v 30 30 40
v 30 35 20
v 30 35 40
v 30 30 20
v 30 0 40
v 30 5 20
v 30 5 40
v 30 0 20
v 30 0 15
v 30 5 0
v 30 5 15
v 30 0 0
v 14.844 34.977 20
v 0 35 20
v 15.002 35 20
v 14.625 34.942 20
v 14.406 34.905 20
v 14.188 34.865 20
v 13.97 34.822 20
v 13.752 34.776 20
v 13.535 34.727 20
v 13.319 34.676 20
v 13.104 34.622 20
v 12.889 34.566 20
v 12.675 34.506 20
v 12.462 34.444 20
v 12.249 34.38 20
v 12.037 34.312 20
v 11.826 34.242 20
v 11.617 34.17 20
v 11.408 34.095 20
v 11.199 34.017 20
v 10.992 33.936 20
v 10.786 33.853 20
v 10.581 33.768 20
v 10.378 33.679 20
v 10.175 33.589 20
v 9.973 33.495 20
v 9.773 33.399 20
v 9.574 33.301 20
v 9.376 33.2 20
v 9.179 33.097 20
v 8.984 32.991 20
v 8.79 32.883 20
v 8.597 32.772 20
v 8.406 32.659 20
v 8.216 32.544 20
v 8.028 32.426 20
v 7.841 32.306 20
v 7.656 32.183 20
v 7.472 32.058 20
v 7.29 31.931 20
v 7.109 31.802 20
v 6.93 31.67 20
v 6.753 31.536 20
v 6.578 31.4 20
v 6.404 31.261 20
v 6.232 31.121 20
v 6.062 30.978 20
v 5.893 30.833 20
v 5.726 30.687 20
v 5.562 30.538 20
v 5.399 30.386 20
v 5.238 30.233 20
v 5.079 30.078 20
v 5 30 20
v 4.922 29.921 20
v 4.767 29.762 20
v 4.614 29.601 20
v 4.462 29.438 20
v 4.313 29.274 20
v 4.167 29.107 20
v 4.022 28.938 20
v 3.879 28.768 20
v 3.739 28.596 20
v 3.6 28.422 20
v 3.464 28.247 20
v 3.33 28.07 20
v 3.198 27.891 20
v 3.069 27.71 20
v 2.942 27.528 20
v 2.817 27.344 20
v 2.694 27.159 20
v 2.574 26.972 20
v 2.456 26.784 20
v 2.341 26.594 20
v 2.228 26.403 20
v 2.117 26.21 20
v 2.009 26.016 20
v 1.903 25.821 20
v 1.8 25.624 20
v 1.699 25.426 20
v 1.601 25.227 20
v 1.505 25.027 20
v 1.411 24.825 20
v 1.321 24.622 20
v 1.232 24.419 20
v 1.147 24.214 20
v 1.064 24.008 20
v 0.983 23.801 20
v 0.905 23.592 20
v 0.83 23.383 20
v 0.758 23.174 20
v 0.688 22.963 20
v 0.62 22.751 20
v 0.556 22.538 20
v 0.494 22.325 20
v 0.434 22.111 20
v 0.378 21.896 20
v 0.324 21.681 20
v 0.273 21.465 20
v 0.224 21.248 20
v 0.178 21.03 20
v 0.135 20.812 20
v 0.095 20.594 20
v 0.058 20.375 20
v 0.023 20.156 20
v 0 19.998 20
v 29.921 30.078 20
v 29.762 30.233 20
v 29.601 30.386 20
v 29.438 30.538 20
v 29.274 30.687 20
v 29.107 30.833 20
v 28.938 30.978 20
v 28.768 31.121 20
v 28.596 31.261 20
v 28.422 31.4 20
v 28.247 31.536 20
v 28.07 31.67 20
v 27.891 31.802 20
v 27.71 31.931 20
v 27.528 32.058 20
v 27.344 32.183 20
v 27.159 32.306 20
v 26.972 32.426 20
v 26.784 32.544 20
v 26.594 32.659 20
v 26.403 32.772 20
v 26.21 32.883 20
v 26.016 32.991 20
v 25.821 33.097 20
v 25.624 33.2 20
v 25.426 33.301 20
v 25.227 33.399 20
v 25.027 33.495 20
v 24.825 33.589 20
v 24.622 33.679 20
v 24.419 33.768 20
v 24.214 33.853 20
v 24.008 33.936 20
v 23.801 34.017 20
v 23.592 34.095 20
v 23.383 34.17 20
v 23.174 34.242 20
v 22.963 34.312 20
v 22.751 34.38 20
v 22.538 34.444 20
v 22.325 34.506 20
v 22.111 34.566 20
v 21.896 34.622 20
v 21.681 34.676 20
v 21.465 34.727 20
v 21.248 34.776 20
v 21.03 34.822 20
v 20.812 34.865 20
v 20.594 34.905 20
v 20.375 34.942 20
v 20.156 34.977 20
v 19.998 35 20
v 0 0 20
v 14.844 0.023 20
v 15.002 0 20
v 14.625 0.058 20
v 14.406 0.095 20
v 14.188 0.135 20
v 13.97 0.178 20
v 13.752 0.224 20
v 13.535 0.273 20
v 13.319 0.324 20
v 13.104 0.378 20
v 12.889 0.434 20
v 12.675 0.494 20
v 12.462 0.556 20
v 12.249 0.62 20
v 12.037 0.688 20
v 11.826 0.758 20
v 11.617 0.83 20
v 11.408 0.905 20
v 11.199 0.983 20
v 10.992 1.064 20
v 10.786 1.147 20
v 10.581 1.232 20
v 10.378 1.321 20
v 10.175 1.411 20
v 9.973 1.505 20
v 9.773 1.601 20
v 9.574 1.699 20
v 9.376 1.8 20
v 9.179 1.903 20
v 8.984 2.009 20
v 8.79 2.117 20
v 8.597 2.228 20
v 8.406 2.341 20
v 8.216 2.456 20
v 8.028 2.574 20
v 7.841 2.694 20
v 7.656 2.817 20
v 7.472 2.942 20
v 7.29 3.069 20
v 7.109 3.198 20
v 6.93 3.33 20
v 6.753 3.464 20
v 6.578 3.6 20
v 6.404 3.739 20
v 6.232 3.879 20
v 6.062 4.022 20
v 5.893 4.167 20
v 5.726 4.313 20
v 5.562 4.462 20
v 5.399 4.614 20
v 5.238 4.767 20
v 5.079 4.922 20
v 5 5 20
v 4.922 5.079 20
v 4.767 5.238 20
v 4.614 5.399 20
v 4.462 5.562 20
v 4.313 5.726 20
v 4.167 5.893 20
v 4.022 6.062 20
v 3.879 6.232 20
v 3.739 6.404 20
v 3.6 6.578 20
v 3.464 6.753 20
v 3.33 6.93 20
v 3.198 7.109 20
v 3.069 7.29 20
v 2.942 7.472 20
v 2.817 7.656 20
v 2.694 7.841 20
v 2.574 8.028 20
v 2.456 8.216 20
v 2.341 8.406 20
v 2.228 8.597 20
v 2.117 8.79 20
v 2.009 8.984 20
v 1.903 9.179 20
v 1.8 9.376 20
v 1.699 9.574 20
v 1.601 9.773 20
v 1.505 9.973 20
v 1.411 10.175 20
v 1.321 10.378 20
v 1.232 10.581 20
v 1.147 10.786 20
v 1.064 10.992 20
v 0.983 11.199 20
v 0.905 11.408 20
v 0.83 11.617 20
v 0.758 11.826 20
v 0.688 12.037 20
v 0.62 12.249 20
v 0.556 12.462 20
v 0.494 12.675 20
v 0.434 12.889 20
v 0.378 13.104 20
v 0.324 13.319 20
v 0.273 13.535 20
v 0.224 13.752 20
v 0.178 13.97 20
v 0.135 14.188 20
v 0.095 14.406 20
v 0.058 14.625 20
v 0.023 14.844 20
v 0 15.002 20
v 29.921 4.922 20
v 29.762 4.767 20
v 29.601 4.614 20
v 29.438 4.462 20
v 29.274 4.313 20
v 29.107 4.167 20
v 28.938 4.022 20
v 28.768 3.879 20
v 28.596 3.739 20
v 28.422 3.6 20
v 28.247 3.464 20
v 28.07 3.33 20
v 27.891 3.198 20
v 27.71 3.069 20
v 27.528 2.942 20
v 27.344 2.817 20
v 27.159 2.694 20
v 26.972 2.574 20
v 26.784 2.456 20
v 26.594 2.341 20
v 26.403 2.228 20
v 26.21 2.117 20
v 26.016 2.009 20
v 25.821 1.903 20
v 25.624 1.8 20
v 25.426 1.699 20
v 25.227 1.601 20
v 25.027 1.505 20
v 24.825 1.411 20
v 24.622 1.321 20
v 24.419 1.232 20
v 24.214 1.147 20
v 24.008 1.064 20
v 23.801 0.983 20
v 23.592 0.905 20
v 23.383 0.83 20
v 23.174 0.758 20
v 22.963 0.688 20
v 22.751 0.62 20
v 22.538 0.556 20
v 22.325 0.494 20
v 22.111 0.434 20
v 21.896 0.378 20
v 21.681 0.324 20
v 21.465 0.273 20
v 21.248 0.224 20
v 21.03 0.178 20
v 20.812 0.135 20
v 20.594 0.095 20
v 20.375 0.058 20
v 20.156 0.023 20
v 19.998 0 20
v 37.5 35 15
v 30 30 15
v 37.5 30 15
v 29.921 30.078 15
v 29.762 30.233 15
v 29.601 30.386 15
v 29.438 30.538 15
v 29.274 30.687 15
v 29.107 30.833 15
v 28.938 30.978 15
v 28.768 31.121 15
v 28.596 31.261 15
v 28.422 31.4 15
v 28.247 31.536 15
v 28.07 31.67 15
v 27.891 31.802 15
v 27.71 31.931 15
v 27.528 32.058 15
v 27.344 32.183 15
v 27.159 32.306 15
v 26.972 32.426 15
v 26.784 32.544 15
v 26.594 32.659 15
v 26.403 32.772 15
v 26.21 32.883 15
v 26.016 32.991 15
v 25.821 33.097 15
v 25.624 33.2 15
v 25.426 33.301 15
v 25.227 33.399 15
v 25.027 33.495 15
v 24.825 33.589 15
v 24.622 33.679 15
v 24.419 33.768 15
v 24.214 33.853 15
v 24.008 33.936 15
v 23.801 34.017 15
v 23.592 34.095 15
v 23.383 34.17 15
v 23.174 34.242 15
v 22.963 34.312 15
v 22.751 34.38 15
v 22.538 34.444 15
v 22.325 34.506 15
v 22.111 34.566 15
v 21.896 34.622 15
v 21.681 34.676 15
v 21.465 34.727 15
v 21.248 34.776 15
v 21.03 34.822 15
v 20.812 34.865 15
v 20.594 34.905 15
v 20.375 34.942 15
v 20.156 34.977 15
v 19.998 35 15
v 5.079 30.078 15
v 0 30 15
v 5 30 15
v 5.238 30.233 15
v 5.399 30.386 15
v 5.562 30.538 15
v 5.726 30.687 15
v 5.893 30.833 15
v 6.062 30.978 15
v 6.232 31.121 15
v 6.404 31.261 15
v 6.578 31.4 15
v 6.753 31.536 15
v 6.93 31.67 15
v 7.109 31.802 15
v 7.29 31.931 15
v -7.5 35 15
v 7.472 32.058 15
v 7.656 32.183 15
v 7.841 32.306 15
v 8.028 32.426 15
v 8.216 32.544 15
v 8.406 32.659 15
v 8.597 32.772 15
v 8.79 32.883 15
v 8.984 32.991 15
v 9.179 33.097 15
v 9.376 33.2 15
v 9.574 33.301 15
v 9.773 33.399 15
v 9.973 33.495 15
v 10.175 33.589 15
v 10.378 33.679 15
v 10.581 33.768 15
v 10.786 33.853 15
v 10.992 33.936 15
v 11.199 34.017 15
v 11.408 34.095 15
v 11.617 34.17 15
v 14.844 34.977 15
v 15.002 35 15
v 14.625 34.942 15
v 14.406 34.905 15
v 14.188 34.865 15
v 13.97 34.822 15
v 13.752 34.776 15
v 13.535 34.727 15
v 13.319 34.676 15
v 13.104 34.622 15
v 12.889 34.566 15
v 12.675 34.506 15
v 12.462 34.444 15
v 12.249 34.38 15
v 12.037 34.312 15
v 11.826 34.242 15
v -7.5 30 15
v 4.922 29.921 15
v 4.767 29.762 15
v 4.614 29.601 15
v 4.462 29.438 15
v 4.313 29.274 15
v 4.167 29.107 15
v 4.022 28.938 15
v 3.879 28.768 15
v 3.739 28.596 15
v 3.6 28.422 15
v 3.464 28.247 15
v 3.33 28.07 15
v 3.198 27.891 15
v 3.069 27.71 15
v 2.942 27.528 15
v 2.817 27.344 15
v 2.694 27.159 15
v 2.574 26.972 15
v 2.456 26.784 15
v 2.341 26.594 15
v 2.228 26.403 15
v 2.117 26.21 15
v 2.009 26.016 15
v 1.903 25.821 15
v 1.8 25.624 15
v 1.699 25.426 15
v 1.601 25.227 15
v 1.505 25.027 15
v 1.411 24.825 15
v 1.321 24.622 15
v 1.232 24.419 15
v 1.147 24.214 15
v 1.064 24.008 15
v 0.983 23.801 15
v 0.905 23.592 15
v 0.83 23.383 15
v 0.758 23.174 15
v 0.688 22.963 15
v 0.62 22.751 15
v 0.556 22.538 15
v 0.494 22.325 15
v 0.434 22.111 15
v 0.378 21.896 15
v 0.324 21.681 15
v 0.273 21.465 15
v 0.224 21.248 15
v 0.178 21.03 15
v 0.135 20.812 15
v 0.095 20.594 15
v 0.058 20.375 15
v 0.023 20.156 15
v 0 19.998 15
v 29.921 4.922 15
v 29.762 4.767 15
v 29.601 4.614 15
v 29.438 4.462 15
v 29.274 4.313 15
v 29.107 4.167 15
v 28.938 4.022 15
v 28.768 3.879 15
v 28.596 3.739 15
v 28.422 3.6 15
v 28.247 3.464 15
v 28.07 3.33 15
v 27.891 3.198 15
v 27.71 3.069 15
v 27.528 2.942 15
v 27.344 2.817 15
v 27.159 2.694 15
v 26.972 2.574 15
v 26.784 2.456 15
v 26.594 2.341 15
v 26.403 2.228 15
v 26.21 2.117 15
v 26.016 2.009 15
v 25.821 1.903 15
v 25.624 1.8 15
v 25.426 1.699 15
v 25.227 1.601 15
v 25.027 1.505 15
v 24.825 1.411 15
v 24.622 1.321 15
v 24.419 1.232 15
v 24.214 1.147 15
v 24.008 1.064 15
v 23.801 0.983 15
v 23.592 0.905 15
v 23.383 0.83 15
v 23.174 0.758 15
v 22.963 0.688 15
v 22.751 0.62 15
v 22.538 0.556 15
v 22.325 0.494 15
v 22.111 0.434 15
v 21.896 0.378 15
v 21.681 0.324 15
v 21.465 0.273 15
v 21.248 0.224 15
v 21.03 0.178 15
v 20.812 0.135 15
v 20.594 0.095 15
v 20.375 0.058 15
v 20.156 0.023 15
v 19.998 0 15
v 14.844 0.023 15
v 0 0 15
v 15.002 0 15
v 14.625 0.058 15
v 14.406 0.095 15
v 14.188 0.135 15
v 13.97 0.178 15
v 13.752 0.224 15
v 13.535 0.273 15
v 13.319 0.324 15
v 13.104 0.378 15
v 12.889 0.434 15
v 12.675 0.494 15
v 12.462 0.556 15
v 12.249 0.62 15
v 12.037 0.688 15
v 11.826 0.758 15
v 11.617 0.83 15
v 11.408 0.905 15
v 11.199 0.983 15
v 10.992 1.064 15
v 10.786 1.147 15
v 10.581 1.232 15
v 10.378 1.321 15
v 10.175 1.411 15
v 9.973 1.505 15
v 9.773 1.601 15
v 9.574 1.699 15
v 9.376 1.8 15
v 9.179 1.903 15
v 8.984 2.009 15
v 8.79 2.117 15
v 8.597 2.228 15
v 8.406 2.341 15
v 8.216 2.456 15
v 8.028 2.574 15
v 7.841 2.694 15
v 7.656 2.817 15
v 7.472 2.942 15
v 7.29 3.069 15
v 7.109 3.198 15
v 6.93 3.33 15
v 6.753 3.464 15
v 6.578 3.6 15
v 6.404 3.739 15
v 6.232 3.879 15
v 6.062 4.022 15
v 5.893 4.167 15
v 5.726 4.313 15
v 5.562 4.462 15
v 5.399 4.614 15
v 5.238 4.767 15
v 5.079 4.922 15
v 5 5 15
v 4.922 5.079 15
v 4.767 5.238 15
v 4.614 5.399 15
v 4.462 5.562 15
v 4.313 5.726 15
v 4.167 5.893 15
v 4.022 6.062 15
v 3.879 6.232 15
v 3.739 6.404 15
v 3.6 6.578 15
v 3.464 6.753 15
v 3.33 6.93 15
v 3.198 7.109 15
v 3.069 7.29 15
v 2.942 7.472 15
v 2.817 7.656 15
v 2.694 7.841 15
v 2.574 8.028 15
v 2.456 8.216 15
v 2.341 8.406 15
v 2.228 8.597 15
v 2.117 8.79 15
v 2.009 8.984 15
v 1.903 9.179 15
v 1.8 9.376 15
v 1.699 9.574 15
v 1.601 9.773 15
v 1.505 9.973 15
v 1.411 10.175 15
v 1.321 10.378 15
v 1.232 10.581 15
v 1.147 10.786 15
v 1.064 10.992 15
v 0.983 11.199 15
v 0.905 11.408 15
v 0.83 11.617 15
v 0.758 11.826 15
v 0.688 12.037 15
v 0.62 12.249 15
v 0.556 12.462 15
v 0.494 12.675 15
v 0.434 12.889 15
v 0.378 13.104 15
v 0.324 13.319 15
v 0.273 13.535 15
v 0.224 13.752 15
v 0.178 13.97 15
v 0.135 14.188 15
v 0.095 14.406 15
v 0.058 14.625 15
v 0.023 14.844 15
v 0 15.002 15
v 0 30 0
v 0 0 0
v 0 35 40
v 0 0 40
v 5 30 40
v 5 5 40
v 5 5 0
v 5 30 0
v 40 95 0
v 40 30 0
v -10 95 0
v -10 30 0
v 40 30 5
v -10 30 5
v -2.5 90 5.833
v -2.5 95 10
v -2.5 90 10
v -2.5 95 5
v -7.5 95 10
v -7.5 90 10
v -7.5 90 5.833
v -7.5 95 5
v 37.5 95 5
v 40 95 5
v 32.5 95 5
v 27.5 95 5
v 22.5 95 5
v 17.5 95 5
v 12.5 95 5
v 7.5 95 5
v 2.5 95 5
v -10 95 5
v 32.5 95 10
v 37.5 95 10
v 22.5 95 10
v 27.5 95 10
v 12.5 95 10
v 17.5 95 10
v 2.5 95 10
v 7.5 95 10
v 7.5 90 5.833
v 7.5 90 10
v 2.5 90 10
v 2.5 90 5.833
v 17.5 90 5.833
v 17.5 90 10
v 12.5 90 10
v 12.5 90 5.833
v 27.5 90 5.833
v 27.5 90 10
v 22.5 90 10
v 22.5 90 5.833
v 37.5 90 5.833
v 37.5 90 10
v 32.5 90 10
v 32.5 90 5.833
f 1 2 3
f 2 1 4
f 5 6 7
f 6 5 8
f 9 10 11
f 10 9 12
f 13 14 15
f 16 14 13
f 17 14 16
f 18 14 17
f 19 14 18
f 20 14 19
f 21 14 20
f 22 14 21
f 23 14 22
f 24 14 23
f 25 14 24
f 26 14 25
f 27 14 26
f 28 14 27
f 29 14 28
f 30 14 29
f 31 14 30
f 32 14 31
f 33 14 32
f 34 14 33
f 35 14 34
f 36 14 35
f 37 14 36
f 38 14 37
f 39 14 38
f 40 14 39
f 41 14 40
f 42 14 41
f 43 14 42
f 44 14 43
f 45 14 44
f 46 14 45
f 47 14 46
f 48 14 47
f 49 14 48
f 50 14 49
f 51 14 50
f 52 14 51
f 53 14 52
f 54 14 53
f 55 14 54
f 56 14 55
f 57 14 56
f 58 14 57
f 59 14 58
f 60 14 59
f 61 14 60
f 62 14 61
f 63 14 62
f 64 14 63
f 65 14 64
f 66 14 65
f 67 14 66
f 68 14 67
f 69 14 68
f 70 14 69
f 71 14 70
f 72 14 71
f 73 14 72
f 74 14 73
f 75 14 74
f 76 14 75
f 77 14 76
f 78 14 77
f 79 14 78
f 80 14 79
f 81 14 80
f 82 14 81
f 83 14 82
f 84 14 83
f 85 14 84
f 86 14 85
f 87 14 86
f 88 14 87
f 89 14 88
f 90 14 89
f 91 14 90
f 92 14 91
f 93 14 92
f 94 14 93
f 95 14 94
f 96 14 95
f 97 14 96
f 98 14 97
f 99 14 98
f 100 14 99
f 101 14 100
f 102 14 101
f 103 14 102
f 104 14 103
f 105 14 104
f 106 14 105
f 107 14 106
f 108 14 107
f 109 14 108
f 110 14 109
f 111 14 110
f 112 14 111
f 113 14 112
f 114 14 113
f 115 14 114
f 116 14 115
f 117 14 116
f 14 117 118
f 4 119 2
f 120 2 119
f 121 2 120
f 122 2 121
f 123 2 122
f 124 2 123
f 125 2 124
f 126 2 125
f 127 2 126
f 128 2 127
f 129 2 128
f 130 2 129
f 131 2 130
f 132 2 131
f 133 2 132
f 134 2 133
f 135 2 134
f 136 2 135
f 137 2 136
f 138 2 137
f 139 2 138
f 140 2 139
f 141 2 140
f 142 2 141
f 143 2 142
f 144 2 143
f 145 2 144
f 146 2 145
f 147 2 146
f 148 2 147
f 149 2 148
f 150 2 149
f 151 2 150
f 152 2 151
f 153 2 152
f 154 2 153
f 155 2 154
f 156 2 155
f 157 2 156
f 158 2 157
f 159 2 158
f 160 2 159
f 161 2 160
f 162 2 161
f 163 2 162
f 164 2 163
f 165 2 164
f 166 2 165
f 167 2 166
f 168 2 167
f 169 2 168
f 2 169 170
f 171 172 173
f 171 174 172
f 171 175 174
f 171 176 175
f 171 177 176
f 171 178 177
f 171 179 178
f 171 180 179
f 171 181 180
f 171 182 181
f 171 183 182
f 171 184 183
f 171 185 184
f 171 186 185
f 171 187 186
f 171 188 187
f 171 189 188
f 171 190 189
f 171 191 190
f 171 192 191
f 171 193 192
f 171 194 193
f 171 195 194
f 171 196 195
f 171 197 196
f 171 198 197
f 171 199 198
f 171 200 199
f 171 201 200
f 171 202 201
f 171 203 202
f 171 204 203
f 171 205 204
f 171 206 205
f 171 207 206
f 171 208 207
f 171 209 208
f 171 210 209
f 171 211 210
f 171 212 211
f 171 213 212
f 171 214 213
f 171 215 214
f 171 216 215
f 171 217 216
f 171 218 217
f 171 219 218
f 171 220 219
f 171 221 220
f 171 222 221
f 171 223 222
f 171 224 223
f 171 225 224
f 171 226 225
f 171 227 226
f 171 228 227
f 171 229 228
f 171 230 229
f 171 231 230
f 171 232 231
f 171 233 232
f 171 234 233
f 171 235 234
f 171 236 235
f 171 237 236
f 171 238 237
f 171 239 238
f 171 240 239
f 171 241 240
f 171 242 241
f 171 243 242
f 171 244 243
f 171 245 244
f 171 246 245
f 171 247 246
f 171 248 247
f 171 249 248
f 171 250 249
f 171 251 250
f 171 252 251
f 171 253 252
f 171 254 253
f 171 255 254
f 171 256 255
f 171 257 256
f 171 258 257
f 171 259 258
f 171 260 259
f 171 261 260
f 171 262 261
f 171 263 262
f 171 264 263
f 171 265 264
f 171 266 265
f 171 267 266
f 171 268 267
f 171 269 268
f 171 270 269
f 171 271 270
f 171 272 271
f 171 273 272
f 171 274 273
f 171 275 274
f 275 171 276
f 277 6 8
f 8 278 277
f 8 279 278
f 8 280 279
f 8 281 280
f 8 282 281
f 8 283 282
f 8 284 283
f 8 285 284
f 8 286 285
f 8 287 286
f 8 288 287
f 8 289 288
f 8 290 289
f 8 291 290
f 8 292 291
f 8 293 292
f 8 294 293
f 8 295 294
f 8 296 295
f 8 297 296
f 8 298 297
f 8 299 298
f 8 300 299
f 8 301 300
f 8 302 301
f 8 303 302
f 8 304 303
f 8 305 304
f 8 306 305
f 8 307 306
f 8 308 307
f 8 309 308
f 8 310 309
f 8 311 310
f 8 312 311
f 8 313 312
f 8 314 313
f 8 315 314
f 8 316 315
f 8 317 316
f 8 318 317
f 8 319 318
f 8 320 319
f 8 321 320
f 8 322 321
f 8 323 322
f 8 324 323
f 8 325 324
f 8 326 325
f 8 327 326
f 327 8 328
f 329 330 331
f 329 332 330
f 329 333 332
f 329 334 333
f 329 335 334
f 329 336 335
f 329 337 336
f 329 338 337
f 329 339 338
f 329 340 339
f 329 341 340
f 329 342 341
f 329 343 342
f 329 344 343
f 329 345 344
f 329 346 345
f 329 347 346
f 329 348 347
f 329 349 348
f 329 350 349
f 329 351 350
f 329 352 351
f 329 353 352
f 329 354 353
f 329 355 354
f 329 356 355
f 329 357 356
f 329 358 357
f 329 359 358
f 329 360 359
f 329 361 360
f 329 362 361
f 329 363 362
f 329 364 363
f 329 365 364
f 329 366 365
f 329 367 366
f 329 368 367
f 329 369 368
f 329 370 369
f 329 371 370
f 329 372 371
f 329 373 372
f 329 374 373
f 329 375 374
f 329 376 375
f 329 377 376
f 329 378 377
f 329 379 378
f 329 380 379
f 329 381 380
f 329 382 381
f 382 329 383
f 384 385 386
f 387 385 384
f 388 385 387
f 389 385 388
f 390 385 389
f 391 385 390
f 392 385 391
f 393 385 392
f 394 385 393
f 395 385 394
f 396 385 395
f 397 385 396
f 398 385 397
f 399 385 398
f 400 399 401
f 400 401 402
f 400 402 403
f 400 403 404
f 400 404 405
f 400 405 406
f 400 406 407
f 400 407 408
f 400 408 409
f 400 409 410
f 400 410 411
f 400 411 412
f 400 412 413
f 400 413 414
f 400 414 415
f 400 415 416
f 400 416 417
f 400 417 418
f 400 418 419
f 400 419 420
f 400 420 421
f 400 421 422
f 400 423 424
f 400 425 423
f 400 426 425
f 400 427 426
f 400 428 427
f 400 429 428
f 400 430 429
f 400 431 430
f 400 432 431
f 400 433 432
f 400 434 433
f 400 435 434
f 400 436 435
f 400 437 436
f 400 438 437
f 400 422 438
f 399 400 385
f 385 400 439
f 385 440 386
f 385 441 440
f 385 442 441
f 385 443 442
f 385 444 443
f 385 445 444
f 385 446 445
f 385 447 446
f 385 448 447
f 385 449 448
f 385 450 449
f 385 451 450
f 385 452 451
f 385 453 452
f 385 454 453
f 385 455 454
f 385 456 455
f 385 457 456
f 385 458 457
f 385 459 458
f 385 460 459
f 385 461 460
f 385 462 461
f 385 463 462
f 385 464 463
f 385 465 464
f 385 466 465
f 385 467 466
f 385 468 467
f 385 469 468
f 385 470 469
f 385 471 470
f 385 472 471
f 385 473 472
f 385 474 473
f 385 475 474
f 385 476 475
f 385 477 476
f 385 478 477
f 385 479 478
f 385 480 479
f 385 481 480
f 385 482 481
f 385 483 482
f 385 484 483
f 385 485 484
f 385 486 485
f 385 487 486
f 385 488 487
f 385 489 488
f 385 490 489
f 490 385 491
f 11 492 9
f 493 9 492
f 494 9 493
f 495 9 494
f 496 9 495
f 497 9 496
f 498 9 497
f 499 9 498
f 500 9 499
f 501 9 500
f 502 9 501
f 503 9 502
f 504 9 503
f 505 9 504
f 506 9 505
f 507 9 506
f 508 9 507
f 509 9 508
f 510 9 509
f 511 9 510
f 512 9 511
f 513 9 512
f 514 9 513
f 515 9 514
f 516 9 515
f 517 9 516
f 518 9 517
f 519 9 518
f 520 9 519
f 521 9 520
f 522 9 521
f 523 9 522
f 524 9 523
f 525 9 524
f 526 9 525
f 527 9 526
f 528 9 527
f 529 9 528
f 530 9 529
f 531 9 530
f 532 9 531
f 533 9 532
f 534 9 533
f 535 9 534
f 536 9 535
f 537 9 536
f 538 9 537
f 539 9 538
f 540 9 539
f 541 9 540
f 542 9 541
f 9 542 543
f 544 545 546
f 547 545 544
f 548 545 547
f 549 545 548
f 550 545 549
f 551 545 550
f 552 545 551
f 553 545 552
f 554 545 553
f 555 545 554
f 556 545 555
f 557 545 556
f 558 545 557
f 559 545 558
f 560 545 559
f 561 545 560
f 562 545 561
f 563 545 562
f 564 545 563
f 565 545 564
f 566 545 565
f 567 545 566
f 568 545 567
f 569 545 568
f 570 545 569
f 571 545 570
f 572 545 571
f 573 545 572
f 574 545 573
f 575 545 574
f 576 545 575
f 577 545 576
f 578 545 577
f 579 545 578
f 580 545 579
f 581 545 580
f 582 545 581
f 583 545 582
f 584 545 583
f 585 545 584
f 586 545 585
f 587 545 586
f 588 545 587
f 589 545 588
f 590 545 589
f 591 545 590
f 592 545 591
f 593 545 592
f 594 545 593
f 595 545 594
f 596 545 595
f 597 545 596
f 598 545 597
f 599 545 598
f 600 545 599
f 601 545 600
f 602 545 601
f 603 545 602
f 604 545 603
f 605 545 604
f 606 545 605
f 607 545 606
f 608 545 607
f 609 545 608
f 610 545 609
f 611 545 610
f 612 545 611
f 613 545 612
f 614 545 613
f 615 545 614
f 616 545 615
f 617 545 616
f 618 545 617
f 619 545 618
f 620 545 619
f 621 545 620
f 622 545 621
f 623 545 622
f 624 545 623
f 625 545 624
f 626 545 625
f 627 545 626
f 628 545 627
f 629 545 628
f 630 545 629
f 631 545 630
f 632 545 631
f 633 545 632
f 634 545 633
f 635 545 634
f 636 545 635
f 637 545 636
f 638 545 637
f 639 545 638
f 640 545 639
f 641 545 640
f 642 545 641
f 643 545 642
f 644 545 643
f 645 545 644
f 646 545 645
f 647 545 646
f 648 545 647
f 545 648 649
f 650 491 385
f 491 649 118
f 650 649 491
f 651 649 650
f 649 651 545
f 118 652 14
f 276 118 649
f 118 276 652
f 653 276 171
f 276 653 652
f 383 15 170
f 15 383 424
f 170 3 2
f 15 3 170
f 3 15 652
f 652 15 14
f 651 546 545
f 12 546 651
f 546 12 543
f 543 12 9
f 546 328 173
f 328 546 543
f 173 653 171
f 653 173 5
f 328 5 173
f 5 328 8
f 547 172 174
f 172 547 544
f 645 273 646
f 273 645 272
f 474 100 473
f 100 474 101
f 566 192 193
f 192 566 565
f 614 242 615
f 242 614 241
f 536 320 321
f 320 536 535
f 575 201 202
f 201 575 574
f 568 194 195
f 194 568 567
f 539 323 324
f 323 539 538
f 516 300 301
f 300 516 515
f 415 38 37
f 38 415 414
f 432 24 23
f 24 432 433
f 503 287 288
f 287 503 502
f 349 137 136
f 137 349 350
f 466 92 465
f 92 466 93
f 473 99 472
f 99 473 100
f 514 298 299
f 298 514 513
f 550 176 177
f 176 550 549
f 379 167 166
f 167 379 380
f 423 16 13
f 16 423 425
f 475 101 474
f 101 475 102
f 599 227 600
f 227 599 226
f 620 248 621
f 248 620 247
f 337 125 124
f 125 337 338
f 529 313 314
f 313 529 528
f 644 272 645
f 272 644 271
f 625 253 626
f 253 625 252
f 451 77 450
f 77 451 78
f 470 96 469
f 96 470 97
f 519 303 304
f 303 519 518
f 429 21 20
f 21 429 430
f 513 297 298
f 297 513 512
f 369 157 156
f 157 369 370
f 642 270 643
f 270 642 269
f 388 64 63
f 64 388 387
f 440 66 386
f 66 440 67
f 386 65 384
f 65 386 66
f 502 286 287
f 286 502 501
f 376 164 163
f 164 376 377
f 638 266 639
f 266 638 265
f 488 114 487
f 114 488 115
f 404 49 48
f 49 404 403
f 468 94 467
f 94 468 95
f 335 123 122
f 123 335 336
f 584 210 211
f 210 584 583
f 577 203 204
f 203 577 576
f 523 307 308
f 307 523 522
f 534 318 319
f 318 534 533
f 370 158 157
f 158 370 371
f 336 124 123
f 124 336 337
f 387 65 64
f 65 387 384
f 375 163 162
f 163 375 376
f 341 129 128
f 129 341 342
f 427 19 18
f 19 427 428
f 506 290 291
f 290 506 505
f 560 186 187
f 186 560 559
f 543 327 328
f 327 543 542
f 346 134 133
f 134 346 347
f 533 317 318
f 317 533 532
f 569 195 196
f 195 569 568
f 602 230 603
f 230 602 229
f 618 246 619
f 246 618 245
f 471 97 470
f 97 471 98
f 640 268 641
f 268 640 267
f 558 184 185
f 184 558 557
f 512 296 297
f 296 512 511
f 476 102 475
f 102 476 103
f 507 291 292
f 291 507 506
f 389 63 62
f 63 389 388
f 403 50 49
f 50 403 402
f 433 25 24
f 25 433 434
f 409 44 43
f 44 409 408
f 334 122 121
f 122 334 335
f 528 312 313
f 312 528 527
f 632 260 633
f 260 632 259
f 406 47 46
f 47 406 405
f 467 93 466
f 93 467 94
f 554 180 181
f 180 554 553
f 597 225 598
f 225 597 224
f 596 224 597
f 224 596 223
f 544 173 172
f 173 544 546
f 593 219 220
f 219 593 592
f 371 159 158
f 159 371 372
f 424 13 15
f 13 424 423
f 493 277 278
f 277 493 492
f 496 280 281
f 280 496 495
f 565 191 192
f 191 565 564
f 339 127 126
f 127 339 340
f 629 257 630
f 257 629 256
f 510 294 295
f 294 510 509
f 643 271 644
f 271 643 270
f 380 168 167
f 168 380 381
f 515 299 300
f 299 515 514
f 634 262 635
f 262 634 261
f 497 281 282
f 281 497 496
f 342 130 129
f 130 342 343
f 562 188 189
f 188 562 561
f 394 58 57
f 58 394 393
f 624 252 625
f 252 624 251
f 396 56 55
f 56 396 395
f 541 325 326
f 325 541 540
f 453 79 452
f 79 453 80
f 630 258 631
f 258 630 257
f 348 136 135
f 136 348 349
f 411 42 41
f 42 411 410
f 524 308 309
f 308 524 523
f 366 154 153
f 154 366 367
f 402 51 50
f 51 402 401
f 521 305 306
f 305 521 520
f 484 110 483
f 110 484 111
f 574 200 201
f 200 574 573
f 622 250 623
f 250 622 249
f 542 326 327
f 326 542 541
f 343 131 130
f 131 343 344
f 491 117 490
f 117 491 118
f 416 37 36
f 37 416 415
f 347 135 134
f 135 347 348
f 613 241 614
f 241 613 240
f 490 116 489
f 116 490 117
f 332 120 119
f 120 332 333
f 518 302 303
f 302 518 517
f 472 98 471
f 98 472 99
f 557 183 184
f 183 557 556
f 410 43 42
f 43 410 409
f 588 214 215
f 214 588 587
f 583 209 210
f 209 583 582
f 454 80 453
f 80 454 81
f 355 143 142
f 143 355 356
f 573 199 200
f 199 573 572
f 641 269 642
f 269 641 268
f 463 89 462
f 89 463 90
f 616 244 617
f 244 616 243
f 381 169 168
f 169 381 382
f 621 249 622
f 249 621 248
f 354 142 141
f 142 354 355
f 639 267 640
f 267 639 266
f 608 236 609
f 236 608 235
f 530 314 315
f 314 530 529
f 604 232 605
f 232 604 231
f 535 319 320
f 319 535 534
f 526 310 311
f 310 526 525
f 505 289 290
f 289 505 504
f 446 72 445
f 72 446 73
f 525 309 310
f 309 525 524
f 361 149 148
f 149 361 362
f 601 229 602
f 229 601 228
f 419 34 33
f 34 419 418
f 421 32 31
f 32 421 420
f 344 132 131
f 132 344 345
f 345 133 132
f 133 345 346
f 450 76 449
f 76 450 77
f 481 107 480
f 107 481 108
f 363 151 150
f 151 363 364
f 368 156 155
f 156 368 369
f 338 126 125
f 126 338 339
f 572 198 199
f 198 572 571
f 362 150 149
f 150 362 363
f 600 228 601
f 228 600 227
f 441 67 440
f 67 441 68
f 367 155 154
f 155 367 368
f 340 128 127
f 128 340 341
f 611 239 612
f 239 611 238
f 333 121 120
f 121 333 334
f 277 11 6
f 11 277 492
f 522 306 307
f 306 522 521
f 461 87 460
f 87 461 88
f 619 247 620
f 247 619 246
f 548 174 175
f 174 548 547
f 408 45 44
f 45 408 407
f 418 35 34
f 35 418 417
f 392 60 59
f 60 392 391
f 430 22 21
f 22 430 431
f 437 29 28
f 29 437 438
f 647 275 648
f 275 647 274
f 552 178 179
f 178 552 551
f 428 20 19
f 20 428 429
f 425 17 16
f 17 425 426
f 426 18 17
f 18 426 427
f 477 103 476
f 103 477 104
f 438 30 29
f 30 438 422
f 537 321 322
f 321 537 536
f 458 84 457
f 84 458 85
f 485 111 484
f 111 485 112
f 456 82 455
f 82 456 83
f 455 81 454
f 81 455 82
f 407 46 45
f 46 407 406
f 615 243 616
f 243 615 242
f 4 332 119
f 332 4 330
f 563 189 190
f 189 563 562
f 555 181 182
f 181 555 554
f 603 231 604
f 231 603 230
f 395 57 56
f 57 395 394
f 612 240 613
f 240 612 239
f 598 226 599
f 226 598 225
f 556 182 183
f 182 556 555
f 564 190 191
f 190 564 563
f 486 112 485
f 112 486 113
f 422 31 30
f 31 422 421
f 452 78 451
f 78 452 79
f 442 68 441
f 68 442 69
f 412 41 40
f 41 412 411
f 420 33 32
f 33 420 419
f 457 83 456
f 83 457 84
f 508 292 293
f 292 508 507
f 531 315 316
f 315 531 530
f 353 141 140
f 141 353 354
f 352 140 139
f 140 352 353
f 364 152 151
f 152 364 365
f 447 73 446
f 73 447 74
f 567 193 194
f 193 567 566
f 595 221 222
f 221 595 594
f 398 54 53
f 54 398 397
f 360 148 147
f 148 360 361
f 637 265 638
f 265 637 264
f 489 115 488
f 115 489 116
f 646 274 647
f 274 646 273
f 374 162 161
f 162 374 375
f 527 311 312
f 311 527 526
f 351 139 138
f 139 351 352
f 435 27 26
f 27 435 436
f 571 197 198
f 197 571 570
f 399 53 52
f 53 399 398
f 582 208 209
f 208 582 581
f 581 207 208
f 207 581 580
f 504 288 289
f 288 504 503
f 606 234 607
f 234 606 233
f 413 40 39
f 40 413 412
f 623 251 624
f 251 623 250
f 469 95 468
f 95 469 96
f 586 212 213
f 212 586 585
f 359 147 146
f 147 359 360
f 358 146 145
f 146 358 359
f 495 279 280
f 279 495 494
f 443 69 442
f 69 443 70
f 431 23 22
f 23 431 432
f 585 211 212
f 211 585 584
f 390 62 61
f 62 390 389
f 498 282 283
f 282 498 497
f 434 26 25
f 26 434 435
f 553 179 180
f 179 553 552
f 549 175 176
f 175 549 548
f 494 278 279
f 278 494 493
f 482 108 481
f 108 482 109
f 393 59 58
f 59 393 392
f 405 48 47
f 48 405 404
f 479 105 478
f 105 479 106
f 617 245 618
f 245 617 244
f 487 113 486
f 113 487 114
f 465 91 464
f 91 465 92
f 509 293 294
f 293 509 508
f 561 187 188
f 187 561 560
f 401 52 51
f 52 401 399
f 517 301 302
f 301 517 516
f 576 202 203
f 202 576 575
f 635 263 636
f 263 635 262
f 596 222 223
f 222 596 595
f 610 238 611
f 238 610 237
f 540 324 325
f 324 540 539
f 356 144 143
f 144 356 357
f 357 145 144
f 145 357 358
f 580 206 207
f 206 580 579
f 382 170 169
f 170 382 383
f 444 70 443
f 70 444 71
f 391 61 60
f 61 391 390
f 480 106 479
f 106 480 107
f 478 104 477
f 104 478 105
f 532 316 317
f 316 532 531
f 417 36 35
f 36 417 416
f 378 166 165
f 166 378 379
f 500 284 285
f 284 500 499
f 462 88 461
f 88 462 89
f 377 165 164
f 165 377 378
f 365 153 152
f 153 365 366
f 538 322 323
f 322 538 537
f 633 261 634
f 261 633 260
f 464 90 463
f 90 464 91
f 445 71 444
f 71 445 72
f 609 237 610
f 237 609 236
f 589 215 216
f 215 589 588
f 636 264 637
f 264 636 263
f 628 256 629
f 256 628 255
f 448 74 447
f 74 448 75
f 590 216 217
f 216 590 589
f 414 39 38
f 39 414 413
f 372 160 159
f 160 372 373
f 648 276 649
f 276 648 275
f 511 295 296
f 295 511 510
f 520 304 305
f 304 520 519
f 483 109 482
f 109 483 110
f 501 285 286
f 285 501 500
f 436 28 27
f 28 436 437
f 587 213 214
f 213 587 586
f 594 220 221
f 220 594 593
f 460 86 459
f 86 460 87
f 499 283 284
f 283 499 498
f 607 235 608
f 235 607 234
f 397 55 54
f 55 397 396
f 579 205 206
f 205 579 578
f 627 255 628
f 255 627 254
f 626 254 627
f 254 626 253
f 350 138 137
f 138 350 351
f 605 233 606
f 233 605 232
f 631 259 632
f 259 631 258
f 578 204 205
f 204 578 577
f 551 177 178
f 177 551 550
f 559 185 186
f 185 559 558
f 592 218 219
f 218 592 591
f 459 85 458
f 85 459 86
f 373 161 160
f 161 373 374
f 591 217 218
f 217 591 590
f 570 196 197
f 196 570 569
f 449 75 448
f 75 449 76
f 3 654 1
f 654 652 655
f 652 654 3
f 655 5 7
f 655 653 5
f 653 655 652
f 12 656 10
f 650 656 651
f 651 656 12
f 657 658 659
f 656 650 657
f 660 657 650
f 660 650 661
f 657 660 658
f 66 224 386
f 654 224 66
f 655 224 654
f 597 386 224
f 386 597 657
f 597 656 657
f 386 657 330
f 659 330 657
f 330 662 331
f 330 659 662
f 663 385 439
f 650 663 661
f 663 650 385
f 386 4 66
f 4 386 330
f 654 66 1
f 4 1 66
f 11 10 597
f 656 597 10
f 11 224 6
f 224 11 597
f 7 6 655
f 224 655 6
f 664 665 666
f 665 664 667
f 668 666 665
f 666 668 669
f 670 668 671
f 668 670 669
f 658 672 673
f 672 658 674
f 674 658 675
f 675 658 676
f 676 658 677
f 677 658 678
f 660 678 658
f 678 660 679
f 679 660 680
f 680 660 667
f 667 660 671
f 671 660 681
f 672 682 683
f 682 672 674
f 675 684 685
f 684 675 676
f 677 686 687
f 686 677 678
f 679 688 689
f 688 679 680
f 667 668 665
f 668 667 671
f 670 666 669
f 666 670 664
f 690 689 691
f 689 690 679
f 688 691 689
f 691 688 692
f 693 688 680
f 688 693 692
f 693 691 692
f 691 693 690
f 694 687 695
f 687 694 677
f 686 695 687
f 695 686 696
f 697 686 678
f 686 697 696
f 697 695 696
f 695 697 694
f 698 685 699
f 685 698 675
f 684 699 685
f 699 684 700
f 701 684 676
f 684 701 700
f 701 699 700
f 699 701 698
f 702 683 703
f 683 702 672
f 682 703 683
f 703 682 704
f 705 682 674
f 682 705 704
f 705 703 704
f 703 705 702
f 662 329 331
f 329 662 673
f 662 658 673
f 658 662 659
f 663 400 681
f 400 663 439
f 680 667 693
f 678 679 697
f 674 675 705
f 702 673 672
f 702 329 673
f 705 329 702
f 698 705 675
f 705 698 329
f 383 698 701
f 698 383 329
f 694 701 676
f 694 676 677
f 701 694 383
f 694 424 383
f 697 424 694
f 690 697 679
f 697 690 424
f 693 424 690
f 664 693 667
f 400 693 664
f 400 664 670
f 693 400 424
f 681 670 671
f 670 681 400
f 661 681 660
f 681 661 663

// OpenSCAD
/**
* @author Maciej Urbanski (rooter@kyberian.net)
* @brief  Foot door pull - veritical
* @license GPL
* @date   May, 2020
* @version 1.0
*
* Foot door pool for front gate (square bars).
* Significantly weaker and as it would be mounted higher less practical
* than horizontal version.
*/

gatebar_width=25;
gatebar_depth=gatebar_width;

thickness=5;
height=40;

step_length=60;
step_max_height=3*thickness;
step_width=40;
step_tooth_height=thickness;
step_tooth_width=thickness;
step_tooth_spacing=thickness;

ziptie_width=5;


$fn=500;
TINY=1; // a small number, just to make to avoid renderer issues
INF=10000; // a large number, virtually infitive


grab_w=gatebar_width+thickness;
grab_d=gatebar_depth+2*thickness;

union() {    
    difference() {
        cube([grab_w, grab_d, height]);
        translate([thickness, thickness, -TINY]) cube([gatebar_width+TINY, gatebar_depth, INF]);
        
        rr=gatebar_width*sqrt(2)/2;
        translate([0,0, step_max_height]) {
            difference() {
                cube([grab_w, grab_d, ziptie_width]);
                translate([gatebar_width/2+thickness,gatebar_width/2+thickness, 0]) {
                    cylinder(h=ziptie_width, r=rr);
                }
            }
        }
    }
    
    translate([-(step_width-gatebar_width)/2, grab_d-thickness, 0]) {
        hull() {
            translate([-thickness/2, 0, 0]) cube([step_width+2*thickness, step_length+thickness, thickness]);
            translate([0,0,step_max_height-thickness]) cube([step_width+thickness, thickness, thickness]);
        }
        for(tooth_x=[0:step_tooth_width+step_tooth_spacing:step_width]) {            translate([tooth_x,step_length,thickness]) {
                cube([step_tooth_width, step_tooth_width, step_tooth_height]);
            }
        }
    }
    
}
